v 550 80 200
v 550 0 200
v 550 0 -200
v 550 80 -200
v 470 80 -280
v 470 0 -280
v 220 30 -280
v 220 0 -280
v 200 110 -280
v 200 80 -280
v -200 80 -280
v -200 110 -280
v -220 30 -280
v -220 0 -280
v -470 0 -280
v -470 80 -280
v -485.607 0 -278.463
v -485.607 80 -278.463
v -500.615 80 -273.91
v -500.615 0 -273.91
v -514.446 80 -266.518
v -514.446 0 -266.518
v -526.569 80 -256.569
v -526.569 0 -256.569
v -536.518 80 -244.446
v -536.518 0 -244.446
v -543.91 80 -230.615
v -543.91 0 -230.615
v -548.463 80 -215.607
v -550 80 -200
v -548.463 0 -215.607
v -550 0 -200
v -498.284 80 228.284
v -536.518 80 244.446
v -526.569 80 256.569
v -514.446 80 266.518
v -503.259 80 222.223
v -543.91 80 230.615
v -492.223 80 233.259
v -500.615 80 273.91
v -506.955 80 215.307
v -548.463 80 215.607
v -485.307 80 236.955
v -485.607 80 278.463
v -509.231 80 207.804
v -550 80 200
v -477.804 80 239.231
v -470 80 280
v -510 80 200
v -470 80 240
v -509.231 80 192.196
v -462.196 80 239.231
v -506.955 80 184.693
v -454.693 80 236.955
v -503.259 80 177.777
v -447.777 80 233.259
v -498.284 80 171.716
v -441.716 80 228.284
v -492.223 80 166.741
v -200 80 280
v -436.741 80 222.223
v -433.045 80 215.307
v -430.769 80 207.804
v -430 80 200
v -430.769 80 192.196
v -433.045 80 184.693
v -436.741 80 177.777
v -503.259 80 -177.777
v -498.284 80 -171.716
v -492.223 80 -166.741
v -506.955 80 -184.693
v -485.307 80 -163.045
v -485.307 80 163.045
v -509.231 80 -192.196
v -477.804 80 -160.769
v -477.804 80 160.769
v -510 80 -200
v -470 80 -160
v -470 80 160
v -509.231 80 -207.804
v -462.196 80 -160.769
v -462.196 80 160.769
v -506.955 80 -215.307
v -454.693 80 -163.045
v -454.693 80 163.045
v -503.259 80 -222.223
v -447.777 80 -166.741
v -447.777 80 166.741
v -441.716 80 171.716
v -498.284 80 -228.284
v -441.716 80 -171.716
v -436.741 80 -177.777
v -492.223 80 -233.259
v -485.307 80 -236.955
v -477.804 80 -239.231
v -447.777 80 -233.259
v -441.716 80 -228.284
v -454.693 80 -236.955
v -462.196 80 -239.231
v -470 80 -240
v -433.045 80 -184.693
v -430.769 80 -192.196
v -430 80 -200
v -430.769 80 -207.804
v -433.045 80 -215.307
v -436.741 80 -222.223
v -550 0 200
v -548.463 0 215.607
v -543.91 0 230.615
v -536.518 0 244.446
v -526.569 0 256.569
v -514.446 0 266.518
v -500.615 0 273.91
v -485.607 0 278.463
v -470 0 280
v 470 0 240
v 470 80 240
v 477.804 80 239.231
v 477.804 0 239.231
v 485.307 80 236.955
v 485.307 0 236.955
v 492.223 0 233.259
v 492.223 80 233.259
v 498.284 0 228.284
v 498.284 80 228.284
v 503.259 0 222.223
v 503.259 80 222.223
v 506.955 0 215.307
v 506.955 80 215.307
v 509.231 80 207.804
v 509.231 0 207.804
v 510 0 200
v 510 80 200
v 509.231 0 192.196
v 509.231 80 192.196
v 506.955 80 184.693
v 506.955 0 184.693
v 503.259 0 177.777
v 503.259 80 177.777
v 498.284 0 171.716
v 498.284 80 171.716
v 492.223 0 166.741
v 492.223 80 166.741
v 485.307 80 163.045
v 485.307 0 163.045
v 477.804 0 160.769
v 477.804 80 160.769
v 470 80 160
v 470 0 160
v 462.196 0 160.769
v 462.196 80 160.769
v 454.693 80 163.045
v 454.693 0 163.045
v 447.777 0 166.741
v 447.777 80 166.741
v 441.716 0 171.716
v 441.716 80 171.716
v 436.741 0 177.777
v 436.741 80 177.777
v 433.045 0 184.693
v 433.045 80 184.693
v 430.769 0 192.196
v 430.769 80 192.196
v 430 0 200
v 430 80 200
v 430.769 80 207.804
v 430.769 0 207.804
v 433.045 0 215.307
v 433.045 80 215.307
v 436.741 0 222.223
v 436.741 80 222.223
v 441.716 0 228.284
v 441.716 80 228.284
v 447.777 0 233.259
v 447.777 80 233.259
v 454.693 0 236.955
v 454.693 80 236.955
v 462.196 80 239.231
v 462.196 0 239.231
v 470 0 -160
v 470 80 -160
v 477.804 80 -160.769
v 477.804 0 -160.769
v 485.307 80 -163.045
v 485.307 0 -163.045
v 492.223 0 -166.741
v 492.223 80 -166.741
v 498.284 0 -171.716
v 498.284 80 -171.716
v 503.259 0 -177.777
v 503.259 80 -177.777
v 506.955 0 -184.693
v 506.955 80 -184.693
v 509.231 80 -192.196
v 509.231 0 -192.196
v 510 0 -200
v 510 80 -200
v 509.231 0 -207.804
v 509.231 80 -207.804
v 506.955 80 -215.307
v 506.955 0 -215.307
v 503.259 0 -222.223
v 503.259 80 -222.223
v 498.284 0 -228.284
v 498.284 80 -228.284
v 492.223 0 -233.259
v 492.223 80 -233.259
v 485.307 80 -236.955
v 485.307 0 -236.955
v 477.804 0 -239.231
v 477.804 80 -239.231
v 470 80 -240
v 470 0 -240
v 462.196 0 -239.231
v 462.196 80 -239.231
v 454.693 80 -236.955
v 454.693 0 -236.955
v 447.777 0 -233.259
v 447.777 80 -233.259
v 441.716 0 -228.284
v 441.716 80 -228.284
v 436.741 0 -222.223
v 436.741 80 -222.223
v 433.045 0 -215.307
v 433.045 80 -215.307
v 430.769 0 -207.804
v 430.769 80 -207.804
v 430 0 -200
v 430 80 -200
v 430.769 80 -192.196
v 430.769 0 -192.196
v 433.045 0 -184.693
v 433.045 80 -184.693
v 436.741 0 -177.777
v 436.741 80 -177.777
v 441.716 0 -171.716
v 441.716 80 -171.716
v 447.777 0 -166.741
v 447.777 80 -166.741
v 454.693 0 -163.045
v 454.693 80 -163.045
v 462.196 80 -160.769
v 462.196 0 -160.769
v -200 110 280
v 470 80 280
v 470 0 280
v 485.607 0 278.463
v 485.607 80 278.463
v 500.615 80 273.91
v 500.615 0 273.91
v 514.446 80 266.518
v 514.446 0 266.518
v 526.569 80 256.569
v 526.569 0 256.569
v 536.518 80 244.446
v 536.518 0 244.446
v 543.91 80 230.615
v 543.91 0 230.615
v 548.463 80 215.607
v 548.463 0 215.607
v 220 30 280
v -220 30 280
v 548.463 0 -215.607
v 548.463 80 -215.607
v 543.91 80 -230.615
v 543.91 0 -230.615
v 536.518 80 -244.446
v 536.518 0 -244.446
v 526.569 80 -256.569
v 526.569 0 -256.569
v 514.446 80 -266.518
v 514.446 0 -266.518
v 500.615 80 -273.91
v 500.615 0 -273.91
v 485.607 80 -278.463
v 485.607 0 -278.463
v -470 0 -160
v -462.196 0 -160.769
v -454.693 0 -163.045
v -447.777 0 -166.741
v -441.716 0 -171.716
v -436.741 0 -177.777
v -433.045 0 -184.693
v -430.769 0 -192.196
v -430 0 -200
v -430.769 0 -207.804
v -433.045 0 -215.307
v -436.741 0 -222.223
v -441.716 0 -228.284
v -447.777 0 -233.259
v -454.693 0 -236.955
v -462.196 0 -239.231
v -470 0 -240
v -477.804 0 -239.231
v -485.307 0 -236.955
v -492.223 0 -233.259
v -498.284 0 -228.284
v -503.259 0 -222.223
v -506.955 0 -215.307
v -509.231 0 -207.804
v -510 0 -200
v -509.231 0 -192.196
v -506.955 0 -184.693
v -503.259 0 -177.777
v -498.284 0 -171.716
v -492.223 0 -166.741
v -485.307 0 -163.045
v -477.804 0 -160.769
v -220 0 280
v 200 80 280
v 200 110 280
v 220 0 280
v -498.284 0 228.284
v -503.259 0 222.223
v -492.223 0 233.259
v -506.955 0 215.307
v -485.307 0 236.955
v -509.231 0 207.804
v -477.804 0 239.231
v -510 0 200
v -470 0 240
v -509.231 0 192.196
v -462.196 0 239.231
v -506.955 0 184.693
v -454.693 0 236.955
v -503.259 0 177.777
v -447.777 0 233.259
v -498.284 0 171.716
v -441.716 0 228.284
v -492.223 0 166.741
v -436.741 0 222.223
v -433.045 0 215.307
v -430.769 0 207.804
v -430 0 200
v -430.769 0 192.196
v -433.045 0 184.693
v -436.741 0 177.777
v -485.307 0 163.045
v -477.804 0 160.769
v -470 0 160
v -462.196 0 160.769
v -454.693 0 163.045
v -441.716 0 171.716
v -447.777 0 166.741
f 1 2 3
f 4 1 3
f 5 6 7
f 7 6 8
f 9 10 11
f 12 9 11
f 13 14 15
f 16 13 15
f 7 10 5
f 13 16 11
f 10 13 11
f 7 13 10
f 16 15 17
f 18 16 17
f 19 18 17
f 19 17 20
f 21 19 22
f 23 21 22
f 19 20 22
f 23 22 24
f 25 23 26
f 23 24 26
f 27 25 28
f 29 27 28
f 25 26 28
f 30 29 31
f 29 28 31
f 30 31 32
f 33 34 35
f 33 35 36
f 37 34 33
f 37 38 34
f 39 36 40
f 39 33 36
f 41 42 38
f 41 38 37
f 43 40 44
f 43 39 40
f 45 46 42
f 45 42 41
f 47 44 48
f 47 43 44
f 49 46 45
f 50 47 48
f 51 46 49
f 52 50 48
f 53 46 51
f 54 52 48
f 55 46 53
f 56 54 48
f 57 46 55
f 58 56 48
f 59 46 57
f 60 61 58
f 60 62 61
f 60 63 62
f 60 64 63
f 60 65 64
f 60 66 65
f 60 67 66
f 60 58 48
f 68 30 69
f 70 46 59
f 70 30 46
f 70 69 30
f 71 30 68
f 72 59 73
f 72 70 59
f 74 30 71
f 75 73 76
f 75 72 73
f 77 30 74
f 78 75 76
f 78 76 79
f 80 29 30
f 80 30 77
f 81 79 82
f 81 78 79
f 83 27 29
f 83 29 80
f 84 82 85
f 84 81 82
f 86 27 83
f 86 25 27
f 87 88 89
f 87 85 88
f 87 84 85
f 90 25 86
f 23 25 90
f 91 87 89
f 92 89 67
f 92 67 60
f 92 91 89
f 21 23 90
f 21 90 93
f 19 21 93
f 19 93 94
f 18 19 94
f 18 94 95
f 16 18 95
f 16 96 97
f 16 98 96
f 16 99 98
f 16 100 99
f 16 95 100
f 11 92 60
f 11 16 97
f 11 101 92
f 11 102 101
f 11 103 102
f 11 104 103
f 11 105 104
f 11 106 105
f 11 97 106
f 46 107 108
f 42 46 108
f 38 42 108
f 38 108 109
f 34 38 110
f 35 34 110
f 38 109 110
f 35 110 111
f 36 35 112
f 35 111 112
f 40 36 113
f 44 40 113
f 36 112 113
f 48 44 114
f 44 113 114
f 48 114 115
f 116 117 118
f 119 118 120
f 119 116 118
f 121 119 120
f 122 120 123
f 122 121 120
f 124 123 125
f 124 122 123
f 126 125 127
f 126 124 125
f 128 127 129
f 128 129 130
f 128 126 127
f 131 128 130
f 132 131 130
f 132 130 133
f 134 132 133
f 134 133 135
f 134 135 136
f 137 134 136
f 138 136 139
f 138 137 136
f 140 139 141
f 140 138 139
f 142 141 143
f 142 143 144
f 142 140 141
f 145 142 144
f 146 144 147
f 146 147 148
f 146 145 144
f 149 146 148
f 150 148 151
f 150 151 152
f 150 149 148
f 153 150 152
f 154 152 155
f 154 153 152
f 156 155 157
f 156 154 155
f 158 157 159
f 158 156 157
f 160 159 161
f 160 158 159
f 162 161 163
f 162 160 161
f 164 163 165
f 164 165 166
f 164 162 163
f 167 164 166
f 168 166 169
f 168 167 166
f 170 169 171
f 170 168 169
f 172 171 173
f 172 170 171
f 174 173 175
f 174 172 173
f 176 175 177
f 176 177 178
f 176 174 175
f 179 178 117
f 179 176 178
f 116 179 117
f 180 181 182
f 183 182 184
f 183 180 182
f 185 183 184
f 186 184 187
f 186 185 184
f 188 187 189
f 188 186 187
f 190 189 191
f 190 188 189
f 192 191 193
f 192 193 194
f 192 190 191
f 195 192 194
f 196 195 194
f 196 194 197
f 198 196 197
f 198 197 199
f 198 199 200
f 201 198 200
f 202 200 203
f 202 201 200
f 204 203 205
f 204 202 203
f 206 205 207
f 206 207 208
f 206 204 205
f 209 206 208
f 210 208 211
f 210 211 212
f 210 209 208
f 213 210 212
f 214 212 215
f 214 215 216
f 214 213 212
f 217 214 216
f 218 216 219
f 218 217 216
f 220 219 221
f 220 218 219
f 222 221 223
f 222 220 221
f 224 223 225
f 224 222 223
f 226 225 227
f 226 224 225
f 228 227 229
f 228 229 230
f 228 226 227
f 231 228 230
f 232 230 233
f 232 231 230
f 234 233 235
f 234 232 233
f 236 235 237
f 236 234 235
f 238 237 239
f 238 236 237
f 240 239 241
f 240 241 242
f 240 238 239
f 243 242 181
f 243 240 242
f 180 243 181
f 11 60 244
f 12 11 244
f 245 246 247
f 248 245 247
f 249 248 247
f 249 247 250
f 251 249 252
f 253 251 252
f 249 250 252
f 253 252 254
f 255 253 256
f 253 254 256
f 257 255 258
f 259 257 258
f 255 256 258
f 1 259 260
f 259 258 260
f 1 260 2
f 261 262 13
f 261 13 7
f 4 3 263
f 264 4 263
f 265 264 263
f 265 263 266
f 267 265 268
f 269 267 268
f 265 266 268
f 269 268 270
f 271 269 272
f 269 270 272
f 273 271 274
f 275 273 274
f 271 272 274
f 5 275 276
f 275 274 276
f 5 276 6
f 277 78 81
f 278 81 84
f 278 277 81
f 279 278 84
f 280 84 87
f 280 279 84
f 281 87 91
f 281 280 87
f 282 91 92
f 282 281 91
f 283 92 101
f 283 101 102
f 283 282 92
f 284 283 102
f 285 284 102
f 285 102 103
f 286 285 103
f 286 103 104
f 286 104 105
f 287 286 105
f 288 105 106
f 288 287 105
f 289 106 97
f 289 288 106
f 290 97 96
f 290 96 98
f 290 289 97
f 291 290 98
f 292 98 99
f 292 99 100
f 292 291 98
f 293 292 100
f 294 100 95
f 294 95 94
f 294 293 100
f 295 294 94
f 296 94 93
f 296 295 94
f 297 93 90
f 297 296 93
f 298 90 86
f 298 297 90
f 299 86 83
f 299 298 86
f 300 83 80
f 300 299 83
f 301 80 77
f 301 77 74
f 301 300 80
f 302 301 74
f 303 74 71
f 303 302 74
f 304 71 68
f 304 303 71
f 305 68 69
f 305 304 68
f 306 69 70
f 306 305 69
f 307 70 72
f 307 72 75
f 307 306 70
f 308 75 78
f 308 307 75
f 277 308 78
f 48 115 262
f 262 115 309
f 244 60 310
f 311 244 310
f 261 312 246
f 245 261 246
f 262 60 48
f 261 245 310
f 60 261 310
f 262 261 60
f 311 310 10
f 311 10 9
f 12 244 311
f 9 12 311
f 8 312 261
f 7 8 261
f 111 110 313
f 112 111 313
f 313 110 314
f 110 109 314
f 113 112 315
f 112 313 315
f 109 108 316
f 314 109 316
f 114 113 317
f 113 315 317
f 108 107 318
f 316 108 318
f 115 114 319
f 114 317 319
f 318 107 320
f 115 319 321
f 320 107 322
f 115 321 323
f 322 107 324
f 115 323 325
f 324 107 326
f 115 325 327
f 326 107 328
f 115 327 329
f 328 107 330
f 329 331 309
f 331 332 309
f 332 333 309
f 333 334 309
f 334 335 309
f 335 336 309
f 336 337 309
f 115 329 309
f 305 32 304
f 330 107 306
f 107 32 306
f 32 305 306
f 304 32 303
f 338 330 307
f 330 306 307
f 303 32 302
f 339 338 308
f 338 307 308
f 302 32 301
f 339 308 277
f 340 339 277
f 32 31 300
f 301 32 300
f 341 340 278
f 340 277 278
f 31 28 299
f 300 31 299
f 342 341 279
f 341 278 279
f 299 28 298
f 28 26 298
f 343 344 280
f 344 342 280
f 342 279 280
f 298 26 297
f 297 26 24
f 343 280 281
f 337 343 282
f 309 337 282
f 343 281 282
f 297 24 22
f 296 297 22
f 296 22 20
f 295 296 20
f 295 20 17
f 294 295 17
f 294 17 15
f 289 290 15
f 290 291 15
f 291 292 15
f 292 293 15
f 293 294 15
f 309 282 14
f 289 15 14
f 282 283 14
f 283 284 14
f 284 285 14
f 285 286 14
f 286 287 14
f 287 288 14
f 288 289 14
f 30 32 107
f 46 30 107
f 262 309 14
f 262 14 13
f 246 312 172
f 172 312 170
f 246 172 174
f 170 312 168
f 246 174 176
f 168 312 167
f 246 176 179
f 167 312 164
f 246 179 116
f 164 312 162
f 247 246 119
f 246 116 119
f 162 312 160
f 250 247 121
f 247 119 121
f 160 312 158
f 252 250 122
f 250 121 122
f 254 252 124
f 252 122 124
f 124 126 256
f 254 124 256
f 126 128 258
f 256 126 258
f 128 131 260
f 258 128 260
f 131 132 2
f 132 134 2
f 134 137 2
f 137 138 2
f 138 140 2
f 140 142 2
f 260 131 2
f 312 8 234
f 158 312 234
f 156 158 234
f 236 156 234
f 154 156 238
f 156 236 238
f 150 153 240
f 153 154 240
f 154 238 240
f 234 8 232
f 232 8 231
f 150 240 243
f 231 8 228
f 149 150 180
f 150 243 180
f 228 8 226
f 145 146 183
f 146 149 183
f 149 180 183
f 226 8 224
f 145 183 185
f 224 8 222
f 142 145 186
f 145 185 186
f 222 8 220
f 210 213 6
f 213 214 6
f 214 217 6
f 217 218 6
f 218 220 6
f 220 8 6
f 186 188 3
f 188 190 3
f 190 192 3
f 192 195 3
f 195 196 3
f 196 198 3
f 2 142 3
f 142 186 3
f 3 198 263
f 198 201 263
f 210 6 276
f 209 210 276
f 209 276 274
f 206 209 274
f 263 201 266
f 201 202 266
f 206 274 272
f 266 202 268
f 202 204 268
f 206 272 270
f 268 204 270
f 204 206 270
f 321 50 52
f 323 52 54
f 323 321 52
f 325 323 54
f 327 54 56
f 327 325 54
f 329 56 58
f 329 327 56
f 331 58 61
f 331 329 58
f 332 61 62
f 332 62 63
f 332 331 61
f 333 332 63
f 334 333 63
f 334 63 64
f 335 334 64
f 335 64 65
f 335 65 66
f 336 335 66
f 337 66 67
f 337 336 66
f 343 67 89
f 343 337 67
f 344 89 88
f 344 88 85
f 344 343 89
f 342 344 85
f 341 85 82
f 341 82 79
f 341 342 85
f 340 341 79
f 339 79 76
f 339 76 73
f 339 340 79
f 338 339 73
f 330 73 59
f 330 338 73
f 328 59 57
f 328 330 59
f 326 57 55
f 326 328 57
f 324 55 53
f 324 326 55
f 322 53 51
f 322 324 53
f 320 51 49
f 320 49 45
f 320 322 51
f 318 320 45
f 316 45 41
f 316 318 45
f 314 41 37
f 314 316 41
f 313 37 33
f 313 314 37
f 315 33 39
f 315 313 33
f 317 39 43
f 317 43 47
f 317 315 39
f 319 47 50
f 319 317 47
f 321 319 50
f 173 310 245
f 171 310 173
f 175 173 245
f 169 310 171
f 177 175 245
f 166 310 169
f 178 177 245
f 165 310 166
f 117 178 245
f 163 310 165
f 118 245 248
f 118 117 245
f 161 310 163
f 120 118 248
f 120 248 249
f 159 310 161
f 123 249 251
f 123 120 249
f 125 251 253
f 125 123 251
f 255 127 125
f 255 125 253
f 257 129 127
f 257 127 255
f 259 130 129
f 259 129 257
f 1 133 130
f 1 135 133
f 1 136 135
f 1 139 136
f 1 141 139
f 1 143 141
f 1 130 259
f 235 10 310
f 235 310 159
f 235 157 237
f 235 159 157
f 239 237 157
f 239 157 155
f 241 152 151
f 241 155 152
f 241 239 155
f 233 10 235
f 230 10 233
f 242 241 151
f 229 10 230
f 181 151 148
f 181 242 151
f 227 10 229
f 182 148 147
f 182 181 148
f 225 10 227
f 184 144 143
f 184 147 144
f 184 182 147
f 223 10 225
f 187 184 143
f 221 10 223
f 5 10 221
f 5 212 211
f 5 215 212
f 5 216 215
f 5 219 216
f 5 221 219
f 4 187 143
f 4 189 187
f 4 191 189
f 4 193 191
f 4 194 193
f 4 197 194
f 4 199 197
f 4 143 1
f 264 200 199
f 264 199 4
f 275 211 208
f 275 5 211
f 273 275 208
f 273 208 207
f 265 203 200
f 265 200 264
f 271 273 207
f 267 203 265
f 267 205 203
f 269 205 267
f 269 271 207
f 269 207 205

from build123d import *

# Parameters (mm, degrees)
IZIM1_R                     = 40
Y_KSEKLIK_EKSTR_ZYON1_DEPTH = 80
IZIM2_W                     = 440
IZIM2_H                     = 30
KES_EKSTR_ZYON1_DEPTH       = 789.986691903
IZIM3_W                     = 400
IZIM3_H                     = 30
Y_KSEKLIK_EKSTR_ZYON2_DEPTH = 560


with BuildPart() as part:
    # Çizim1 → Yükseklik-Ekstrüzyon1 (new body)
    with BuildSketch(Plane(origin=(0, 0, 0), x_dir=(1, 0, 0), z_dir=(0, 1, 0))):
        with BuildLine():
            Line((-470, -280), (470, -280))
            ThreePointArc((470, -280), (526.568542495, -256.568542495), (550, -200))
            Line((550, -200), (550, 200))
            ThreePointArc((550, 200), (526.568542495, 256.568542495), (470, 280))
            Line((470, 280), (-470, 280))
            ThreePointArc((-470, 280), (-526.568542495, 256.568542495), (-550, 200))
            Line((-550, 200), (-550, -200))
            ThreePointArc((-550, -200), (-526.568542495, -256.568542495), (-470, -280))
        make_face()
        with Locations(Location((-470, 200, 0), (0, 0, 270))):
            Circle(IZIM1_R, mode=Mode.SUBTRACT)
        with Locations(Location((-470, -200, 0), (0, 0, 270))):
            Circle(IZIM1_R, mode=Mode.SUBTRACT)
        with Locations(Location((470, -200, 0), (0, 0, 270))):
            Circle(IZIM1_R, mode=Mode.SUBTRACT)
        with Locations(Location((470, 200, 0), (0, 0, 270))):
            Circle(IZIM1_R, mode=Mode.SUBTRACT)
    extrude(amount=Y_KSEKLIK_EKSTR_ZYON1_DEPTH)

    # Çizim2 → Kes-Ekstrüzyon1 (cut, through all)
    with BuildSketch(Plane.XY.offset(280)):
        with Locations((0, 15)):
            Rectangle(IZIM2_W, IZIM2_H)
    extrude(amount=-KES_EKSTR_ZYON1_DEPTH, mode=Mode.SUBTRACT)

    # Çizim3 → Yükseklik-Ekstrüzyon2 (add)
    with BuildSketch(Plane.XY.offset(280)):
        with Locations((0, 95)):
            Rectangle(IZIM3_W, IZIM3_H)
    extrude(amount=-Y_KSEKLIK_EKSTR_ZYON2_DEPTH)


solid = part.part
